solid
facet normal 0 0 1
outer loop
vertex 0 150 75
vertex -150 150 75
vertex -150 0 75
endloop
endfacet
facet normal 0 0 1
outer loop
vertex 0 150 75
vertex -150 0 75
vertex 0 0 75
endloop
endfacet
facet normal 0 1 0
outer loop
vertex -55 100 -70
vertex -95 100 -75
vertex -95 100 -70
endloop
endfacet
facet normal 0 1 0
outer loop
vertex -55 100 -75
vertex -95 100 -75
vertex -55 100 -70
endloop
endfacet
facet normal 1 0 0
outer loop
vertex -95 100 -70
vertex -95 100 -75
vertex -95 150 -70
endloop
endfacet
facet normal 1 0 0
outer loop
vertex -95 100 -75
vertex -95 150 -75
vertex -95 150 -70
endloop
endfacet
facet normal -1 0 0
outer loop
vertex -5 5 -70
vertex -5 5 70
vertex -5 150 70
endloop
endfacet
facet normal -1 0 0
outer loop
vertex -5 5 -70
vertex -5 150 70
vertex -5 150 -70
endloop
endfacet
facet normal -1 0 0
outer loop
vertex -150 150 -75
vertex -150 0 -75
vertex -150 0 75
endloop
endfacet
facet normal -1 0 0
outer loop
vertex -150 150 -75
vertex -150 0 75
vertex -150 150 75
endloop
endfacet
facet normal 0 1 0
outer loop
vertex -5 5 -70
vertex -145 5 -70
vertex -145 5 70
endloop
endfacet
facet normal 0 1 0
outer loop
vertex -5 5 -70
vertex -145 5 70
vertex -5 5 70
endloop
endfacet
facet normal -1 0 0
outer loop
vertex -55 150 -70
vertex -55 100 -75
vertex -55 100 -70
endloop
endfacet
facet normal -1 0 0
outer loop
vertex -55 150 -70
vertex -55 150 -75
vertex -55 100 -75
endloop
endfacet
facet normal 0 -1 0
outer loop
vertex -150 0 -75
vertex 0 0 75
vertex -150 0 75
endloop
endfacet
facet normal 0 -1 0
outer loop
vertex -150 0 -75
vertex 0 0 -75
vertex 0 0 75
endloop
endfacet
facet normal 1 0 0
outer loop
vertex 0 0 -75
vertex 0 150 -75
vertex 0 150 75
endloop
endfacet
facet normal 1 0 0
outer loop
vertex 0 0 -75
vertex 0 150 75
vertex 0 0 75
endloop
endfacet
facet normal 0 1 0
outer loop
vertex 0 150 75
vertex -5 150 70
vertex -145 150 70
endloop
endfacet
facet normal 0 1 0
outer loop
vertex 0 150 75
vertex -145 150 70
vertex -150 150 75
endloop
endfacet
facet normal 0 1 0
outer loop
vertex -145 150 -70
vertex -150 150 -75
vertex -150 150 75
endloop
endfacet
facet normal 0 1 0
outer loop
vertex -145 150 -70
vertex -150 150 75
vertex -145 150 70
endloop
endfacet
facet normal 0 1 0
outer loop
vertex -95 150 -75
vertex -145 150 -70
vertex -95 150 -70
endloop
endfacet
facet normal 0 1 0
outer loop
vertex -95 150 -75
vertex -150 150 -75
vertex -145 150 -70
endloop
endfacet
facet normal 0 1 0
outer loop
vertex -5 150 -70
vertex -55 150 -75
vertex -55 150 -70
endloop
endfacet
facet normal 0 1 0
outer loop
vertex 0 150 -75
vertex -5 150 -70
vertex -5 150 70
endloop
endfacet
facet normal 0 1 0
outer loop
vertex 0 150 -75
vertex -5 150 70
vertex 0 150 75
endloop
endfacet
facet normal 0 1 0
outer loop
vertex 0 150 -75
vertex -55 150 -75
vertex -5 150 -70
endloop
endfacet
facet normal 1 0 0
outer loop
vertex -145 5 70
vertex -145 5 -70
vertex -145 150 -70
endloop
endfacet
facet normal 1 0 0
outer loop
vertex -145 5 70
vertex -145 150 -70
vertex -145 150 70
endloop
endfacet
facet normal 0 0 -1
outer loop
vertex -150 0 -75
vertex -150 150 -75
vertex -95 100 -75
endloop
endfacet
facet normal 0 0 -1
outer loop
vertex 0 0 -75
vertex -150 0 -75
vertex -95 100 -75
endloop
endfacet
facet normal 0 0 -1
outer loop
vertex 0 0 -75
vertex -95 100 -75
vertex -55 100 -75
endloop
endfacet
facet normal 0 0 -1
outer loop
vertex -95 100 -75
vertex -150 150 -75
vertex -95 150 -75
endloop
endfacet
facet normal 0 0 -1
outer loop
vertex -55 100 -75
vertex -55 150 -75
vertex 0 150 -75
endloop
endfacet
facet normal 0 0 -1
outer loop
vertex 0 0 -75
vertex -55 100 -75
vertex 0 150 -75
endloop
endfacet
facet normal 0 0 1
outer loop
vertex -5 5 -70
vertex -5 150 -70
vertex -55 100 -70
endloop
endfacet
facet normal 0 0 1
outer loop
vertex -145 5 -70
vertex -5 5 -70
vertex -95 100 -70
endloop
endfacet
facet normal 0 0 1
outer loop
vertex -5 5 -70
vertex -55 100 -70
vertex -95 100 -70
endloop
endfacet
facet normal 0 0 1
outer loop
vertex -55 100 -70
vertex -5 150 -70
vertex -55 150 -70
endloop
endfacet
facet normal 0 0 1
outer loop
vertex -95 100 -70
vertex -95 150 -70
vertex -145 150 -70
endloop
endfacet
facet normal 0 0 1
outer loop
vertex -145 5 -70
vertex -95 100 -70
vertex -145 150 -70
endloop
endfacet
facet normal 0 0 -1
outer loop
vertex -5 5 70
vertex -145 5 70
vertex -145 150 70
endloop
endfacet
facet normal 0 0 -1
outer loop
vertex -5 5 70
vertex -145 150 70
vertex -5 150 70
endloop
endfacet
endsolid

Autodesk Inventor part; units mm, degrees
ref_plane "YZ Plane" through (0, 0, 0) normal (1, 0, 0) x (0, 1, 0)
ref_plane "XZ Plane" through (0, 0, 0) normal (0, 1, 0) x (-1, 0, 0)
ref_plane "XY Plane" through (0, 0, 0) normal (0, 0, 1) x (1, 0, 0)
sketch "Sketch1" plane through (0, 0, 0) normal (0, 0, 1) x (1, 0, 0)
  line L0 (0, 0) -> (-150, 0)
  line L1 (-150, 0) -> (-150, 150)
  line L2 (-150, 150) -> (0, 150)
  line L3 (0, 150) -> (0, 0)
  dimension "d0" = 150
  dimension "d1" = 150
extrude "Extrusion1" add sketch "Sketch1" along normal mid plane 150
sketch "Sketch2" plane through (-150, 150, 75) normal (0, 1, 0) x (1, 0, 0)
  line L0 (150, 0) -> (0, 0) projected
  line L1 (150, 150) -> (150, 0) projected
  line L2 (0, 0) -> (150, 0)
  line L3 (150, 0) -> (150, 150)
  line L4 (150, 150) -> (0, 150)
  line L5 (0, 150) -> (0, 0)
  line L6 (5, 5) -> (145, 5)
  line L7 (145, 5) -> (145, 145)
  line L8 (145, 145) -> (5, 145)
  line L9 (5, 145) -> (5, 5)
  point P0 (150, 75)
  dimension "d4" = 5
  dimension "d5" = 5
  dimension "d6" = 5
  dimension "d7" = 5
extrude "Extrusion2" cut sketch "Sketch2" against normal blind 145 contours L9 L8 L7 L6
sketch "Sketch3" plane through (-150, 150, 75) normal (0, 1, 0) x (1, 0, 0)
  line L0 (0, 0) -> (150, 0)
  line L1 (150, 0) -> (150, 150)
  line L2 (150, 150) -> (0, 150)
  line L3 (0, 150) -> (0, 0)
  line L4 (150, 150) -> (0, 150) projected
  line L5 (75, 150) -> (75, 0) construction
  line L6 (55, 150) -> (55, 145)
  line L7 (5, 145) -> (145, 145) construction
  line L8 (55, 145) -> (95, 145)
  line L9 (95, 150) -> (95, 145)
  point P0 (150, 75)
  dimension "d10" = 20
  dimension "d11" = 20
extrude "Extrusion3" cut sketch "Sketch3" against normal blind 50 contours L2 L9 L8 L6
properties part number "electronics bay"
